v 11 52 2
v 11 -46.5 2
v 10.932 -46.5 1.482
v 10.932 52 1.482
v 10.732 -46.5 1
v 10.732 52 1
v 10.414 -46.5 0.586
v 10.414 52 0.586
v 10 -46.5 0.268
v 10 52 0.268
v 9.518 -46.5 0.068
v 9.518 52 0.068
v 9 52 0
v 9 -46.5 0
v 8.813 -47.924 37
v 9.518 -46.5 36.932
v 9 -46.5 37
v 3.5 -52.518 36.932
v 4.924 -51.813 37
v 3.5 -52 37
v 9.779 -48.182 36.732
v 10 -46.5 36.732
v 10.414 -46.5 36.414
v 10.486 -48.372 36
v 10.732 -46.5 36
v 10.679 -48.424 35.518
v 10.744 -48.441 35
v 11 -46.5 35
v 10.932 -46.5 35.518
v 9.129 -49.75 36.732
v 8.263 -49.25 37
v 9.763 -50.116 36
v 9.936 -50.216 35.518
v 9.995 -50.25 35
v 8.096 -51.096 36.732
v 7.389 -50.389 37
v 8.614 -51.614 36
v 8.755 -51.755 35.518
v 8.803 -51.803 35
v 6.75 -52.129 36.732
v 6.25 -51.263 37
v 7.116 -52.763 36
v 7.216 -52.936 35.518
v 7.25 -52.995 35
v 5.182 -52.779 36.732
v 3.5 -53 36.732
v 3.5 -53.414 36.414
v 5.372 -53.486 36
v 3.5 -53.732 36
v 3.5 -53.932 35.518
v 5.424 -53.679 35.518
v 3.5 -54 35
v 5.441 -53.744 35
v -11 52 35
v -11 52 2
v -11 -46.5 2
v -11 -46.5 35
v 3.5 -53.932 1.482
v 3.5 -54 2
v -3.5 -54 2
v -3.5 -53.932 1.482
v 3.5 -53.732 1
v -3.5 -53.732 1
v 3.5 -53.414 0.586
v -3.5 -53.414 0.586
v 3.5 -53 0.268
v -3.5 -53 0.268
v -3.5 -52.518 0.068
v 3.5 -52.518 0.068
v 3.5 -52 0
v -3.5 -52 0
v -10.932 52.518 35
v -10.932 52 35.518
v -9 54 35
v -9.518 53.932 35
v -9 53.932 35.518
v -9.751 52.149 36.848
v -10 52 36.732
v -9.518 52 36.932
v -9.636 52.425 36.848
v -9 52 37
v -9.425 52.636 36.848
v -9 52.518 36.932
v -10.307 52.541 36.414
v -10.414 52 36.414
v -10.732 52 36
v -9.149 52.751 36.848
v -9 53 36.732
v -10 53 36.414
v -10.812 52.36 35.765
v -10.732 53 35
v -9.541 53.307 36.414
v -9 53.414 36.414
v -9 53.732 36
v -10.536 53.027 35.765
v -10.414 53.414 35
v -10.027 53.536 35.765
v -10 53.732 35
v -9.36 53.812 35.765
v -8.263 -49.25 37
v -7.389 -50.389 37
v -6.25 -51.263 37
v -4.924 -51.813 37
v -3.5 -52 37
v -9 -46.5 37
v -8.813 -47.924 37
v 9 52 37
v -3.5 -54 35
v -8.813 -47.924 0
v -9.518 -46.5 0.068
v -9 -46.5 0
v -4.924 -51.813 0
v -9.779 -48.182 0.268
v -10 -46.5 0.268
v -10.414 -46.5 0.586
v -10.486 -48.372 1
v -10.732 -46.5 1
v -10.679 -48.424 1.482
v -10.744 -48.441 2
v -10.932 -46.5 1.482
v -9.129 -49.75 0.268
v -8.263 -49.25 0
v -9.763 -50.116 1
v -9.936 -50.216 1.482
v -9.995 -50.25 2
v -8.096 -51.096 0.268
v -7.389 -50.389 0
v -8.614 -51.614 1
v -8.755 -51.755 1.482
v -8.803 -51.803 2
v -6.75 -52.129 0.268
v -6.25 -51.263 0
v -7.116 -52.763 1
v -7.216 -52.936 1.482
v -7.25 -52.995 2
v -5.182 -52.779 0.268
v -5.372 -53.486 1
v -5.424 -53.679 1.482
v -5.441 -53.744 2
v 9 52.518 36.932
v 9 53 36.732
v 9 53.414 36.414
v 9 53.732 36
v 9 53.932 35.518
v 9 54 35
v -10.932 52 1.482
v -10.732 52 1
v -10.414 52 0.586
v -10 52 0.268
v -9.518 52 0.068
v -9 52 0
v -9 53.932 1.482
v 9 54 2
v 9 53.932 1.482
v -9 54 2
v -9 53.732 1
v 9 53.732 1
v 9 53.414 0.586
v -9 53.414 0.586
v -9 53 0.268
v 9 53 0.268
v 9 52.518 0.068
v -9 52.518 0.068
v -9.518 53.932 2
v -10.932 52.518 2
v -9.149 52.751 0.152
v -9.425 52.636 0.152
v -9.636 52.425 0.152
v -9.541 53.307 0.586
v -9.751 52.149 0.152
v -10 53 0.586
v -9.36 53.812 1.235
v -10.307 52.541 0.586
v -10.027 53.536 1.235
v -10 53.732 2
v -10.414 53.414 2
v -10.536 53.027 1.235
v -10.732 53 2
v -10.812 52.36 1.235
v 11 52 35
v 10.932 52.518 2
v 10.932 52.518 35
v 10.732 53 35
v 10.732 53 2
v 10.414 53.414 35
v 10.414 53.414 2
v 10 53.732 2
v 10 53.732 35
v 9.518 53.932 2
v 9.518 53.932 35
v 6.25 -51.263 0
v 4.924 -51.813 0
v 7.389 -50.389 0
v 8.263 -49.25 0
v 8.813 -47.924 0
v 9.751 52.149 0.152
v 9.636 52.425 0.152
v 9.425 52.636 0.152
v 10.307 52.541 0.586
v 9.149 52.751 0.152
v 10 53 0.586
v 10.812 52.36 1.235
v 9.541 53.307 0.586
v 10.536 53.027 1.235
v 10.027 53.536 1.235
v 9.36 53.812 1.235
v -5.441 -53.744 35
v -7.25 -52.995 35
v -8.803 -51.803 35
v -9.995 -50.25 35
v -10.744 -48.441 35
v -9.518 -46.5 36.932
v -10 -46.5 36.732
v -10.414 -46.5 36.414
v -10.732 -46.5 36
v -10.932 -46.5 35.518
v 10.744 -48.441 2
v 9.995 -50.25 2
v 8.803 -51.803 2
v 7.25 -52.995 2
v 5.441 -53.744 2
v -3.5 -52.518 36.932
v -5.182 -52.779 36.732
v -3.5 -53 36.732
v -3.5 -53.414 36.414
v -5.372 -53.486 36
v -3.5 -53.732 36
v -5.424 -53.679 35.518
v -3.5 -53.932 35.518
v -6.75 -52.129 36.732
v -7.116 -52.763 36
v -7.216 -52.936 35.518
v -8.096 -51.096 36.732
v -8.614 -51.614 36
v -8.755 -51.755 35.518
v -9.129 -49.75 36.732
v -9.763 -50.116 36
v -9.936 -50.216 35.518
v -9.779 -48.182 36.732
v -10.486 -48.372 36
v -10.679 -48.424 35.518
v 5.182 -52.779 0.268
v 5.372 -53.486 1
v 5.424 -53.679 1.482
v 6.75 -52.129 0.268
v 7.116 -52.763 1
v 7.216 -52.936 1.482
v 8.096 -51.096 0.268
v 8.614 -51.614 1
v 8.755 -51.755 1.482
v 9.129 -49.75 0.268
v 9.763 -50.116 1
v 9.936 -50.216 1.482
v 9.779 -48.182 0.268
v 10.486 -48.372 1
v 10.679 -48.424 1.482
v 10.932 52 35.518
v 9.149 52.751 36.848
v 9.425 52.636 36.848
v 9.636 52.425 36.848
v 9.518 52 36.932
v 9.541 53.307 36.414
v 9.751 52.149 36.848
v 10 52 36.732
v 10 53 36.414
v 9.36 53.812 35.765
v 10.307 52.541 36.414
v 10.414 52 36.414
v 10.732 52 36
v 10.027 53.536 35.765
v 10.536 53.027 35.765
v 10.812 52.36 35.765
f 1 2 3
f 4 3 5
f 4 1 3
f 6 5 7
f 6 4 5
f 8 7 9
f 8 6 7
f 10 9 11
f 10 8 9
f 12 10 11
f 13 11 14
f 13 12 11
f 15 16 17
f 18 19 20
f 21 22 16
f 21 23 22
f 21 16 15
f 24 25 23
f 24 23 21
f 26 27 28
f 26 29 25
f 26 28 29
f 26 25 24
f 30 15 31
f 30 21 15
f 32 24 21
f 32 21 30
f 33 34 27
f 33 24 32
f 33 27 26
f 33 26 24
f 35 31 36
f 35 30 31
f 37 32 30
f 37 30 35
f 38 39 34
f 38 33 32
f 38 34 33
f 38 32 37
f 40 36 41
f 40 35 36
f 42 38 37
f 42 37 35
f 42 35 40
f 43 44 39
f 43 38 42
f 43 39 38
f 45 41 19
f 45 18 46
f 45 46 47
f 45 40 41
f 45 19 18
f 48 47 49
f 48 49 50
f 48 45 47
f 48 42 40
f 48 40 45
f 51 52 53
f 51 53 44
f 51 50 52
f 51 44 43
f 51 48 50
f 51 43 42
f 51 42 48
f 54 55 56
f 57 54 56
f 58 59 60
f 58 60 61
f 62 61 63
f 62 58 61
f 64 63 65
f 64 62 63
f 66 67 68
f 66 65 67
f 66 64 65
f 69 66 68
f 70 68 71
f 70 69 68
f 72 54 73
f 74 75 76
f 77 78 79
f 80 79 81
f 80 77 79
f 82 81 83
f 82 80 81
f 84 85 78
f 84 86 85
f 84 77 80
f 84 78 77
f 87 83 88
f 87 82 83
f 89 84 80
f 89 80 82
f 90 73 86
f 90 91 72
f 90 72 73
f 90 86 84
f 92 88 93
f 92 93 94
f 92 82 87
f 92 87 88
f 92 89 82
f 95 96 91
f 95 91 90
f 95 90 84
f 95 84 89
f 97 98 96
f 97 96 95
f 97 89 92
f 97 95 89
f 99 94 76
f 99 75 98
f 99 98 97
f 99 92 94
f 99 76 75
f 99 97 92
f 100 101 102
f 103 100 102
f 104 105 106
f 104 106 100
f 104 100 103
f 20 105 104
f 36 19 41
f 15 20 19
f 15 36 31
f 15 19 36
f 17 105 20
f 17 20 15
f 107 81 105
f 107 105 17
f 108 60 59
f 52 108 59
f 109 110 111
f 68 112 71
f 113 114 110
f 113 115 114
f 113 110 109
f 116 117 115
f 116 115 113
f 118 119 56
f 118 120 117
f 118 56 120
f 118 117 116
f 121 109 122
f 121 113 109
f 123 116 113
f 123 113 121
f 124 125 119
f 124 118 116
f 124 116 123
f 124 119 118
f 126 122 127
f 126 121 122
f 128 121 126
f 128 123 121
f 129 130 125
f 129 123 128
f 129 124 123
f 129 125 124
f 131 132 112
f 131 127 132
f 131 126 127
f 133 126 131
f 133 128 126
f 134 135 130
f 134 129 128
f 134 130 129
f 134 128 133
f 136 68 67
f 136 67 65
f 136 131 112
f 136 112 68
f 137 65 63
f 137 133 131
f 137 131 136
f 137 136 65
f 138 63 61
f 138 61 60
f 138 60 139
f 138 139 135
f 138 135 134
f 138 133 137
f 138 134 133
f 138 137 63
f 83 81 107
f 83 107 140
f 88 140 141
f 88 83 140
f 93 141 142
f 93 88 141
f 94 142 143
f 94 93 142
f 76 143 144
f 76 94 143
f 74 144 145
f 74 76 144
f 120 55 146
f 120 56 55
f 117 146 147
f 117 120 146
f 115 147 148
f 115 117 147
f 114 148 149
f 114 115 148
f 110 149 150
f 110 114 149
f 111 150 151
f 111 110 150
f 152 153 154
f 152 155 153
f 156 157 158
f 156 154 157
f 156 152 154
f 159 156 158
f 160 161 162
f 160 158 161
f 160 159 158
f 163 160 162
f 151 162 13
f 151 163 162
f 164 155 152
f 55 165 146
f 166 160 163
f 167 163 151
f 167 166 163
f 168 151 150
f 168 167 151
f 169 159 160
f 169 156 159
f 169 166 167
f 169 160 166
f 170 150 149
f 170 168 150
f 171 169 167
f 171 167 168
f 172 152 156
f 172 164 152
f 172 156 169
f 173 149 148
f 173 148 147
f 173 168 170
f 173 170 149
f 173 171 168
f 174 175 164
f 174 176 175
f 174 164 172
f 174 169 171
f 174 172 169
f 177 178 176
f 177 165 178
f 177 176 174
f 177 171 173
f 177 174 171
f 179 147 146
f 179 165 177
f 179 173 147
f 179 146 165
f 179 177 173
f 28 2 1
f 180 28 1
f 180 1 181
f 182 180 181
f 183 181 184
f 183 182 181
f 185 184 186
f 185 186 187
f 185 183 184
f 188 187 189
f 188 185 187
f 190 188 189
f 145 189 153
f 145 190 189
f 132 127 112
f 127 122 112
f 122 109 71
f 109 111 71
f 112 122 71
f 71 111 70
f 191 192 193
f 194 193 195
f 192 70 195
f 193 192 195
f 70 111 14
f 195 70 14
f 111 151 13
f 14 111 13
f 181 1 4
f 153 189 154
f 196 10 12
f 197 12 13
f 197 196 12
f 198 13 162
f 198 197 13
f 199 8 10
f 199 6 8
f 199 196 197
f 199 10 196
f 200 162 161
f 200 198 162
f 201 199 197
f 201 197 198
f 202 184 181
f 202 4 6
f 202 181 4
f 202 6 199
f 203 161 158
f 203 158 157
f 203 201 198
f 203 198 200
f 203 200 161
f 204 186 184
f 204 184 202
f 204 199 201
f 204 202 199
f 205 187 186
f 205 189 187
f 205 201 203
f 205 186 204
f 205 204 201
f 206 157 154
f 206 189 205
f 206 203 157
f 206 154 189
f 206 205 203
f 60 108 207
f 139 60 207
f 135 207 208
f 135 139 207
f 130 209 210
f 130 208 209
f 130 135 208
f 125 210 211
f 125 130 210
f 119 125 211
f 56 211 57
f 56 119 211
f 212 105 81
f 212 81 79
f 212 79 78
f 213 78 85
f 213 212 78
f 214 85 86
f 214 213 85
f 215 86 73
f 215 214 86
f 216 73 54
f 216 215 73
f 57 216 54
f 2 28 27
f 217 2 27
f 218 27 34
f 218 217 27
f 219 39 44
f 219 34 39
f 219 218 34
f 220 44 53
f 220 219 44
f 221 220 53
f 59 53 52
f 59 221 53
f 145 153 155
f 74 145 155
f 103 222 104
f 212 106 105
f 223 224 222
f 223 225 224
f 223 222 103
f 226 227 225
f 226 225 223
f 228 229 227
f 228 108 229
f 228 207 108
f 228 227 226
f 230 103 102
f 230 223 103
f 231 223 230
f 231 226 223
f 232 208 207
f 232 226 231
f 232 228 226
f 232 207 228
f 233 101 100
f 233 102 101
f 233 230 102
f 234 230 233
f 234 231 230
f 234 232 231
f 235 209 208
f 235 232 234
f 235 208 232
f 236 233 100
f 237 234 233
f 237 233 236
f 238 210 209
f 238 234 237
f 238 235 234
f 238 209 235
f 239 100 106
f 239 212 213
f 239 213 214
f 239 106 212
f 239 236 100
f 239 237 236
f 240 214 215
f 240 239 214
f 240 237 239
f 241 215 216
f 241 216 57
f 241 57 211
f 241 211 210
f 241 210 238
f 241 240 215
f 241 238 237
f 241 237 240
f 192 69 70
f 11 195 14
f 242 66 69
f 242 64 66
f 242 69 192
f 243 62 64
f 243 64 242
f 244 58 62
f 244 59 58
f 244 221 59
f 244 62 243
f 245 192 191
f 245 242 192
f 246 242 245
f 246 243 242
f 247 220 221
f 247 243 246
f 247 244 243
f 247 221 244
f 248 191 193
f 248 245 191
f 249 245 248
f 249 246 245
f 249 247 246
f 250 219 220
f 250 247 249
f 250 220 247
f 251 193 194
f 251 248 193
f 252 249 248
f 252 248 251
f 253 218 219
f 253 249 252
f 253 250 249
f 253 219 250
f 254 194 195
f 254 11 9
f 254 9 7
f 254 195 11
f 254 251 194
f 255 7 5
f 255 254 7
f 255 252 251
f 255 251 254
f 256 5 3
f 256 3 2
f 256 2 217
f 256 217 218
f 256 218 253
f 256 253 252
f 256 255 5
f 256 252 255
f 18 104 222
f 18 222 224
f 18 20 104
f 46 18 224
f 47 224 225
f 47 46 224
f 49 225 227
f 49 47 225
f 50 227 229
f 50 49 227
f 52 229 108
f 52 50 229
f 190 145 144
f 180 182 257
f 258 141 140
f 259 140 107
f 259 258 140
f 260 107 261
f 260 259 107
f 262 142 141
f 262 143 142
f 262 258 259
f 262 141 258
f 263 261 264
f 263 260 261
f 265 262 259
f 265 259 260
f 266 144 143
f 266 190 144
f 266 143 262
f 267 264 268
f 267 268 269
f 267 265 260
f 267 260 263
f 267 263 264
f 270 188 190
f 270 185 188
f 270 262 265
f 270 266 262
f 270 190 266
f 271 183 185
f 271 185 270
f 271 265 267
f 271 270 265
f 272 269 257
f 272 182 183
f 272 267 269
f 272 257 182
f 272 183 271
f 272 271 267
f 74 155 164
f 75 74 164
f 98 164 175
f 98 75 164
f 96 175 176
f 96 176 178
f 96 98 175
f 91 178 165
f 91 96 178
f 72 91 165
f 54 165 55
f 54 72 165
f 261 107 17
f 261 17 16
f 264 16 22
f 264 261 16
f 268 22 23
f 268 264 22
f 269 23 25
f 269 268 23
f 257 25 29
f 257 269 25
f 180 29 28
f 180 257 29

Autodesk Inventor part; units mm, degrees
ref_plane "YZ Plane" through (0, 0, 0) normal (1, 0, 0) x (0, 1, 0)
ref_plane "XZ Plane" through (0, 0, 0) normal (0, 1, 0) x (-1, 0, 0)
ref_plane "XY Plane" through (0, 0, 0) normal (0, 0, 1) x (1, 0, 0)
sketch "Sketch1" plane through (0, 0, 0) normal (0, 0, 1) x (1, 0, 0)
  line L0 (-11, -54) -> (11, -54)
  line L1 (11, -54) -> (11, 54)
  line L2 (11, 54) -> (-11, 54)
  line L3 (-11, 54) -> (-11, -54)
  line L4 (-11, -54) -> (11, 54) construction
  line L5 (11, -54) -> (-11, 54) construction
  point P0 (0, 0)
  dimension "d0" = 22
  dimension "d1" = 108
extrude "Extrusion1" add sketch "Sketch1" along normal blind 37
fillet "Fillet1" radius 2 10 edges at (11, 54, 18.5) (-11, 54, 18.5) (0, 54, 37) (11, 0, 37) (-11, 0, 37) (11, 0, 0) (0, 54, 0) (-11, 0, 0) (0, -54, 37) (0, -54, 0)
fillet "Fillet2" radius 7.5 6 edges at (10.4142, -53.4142, 36.4142) (10.4142, -53.4142, 0.5858) (11, -54, 18.5) (-10.4142, -53.4142, 36.4142) (-10.4142, -53.4142, 0.5858) (-11, -54, 18.5)
properties part number "Lipo-2800-3S-Pack-3" material "Acetal Resin, Black"
